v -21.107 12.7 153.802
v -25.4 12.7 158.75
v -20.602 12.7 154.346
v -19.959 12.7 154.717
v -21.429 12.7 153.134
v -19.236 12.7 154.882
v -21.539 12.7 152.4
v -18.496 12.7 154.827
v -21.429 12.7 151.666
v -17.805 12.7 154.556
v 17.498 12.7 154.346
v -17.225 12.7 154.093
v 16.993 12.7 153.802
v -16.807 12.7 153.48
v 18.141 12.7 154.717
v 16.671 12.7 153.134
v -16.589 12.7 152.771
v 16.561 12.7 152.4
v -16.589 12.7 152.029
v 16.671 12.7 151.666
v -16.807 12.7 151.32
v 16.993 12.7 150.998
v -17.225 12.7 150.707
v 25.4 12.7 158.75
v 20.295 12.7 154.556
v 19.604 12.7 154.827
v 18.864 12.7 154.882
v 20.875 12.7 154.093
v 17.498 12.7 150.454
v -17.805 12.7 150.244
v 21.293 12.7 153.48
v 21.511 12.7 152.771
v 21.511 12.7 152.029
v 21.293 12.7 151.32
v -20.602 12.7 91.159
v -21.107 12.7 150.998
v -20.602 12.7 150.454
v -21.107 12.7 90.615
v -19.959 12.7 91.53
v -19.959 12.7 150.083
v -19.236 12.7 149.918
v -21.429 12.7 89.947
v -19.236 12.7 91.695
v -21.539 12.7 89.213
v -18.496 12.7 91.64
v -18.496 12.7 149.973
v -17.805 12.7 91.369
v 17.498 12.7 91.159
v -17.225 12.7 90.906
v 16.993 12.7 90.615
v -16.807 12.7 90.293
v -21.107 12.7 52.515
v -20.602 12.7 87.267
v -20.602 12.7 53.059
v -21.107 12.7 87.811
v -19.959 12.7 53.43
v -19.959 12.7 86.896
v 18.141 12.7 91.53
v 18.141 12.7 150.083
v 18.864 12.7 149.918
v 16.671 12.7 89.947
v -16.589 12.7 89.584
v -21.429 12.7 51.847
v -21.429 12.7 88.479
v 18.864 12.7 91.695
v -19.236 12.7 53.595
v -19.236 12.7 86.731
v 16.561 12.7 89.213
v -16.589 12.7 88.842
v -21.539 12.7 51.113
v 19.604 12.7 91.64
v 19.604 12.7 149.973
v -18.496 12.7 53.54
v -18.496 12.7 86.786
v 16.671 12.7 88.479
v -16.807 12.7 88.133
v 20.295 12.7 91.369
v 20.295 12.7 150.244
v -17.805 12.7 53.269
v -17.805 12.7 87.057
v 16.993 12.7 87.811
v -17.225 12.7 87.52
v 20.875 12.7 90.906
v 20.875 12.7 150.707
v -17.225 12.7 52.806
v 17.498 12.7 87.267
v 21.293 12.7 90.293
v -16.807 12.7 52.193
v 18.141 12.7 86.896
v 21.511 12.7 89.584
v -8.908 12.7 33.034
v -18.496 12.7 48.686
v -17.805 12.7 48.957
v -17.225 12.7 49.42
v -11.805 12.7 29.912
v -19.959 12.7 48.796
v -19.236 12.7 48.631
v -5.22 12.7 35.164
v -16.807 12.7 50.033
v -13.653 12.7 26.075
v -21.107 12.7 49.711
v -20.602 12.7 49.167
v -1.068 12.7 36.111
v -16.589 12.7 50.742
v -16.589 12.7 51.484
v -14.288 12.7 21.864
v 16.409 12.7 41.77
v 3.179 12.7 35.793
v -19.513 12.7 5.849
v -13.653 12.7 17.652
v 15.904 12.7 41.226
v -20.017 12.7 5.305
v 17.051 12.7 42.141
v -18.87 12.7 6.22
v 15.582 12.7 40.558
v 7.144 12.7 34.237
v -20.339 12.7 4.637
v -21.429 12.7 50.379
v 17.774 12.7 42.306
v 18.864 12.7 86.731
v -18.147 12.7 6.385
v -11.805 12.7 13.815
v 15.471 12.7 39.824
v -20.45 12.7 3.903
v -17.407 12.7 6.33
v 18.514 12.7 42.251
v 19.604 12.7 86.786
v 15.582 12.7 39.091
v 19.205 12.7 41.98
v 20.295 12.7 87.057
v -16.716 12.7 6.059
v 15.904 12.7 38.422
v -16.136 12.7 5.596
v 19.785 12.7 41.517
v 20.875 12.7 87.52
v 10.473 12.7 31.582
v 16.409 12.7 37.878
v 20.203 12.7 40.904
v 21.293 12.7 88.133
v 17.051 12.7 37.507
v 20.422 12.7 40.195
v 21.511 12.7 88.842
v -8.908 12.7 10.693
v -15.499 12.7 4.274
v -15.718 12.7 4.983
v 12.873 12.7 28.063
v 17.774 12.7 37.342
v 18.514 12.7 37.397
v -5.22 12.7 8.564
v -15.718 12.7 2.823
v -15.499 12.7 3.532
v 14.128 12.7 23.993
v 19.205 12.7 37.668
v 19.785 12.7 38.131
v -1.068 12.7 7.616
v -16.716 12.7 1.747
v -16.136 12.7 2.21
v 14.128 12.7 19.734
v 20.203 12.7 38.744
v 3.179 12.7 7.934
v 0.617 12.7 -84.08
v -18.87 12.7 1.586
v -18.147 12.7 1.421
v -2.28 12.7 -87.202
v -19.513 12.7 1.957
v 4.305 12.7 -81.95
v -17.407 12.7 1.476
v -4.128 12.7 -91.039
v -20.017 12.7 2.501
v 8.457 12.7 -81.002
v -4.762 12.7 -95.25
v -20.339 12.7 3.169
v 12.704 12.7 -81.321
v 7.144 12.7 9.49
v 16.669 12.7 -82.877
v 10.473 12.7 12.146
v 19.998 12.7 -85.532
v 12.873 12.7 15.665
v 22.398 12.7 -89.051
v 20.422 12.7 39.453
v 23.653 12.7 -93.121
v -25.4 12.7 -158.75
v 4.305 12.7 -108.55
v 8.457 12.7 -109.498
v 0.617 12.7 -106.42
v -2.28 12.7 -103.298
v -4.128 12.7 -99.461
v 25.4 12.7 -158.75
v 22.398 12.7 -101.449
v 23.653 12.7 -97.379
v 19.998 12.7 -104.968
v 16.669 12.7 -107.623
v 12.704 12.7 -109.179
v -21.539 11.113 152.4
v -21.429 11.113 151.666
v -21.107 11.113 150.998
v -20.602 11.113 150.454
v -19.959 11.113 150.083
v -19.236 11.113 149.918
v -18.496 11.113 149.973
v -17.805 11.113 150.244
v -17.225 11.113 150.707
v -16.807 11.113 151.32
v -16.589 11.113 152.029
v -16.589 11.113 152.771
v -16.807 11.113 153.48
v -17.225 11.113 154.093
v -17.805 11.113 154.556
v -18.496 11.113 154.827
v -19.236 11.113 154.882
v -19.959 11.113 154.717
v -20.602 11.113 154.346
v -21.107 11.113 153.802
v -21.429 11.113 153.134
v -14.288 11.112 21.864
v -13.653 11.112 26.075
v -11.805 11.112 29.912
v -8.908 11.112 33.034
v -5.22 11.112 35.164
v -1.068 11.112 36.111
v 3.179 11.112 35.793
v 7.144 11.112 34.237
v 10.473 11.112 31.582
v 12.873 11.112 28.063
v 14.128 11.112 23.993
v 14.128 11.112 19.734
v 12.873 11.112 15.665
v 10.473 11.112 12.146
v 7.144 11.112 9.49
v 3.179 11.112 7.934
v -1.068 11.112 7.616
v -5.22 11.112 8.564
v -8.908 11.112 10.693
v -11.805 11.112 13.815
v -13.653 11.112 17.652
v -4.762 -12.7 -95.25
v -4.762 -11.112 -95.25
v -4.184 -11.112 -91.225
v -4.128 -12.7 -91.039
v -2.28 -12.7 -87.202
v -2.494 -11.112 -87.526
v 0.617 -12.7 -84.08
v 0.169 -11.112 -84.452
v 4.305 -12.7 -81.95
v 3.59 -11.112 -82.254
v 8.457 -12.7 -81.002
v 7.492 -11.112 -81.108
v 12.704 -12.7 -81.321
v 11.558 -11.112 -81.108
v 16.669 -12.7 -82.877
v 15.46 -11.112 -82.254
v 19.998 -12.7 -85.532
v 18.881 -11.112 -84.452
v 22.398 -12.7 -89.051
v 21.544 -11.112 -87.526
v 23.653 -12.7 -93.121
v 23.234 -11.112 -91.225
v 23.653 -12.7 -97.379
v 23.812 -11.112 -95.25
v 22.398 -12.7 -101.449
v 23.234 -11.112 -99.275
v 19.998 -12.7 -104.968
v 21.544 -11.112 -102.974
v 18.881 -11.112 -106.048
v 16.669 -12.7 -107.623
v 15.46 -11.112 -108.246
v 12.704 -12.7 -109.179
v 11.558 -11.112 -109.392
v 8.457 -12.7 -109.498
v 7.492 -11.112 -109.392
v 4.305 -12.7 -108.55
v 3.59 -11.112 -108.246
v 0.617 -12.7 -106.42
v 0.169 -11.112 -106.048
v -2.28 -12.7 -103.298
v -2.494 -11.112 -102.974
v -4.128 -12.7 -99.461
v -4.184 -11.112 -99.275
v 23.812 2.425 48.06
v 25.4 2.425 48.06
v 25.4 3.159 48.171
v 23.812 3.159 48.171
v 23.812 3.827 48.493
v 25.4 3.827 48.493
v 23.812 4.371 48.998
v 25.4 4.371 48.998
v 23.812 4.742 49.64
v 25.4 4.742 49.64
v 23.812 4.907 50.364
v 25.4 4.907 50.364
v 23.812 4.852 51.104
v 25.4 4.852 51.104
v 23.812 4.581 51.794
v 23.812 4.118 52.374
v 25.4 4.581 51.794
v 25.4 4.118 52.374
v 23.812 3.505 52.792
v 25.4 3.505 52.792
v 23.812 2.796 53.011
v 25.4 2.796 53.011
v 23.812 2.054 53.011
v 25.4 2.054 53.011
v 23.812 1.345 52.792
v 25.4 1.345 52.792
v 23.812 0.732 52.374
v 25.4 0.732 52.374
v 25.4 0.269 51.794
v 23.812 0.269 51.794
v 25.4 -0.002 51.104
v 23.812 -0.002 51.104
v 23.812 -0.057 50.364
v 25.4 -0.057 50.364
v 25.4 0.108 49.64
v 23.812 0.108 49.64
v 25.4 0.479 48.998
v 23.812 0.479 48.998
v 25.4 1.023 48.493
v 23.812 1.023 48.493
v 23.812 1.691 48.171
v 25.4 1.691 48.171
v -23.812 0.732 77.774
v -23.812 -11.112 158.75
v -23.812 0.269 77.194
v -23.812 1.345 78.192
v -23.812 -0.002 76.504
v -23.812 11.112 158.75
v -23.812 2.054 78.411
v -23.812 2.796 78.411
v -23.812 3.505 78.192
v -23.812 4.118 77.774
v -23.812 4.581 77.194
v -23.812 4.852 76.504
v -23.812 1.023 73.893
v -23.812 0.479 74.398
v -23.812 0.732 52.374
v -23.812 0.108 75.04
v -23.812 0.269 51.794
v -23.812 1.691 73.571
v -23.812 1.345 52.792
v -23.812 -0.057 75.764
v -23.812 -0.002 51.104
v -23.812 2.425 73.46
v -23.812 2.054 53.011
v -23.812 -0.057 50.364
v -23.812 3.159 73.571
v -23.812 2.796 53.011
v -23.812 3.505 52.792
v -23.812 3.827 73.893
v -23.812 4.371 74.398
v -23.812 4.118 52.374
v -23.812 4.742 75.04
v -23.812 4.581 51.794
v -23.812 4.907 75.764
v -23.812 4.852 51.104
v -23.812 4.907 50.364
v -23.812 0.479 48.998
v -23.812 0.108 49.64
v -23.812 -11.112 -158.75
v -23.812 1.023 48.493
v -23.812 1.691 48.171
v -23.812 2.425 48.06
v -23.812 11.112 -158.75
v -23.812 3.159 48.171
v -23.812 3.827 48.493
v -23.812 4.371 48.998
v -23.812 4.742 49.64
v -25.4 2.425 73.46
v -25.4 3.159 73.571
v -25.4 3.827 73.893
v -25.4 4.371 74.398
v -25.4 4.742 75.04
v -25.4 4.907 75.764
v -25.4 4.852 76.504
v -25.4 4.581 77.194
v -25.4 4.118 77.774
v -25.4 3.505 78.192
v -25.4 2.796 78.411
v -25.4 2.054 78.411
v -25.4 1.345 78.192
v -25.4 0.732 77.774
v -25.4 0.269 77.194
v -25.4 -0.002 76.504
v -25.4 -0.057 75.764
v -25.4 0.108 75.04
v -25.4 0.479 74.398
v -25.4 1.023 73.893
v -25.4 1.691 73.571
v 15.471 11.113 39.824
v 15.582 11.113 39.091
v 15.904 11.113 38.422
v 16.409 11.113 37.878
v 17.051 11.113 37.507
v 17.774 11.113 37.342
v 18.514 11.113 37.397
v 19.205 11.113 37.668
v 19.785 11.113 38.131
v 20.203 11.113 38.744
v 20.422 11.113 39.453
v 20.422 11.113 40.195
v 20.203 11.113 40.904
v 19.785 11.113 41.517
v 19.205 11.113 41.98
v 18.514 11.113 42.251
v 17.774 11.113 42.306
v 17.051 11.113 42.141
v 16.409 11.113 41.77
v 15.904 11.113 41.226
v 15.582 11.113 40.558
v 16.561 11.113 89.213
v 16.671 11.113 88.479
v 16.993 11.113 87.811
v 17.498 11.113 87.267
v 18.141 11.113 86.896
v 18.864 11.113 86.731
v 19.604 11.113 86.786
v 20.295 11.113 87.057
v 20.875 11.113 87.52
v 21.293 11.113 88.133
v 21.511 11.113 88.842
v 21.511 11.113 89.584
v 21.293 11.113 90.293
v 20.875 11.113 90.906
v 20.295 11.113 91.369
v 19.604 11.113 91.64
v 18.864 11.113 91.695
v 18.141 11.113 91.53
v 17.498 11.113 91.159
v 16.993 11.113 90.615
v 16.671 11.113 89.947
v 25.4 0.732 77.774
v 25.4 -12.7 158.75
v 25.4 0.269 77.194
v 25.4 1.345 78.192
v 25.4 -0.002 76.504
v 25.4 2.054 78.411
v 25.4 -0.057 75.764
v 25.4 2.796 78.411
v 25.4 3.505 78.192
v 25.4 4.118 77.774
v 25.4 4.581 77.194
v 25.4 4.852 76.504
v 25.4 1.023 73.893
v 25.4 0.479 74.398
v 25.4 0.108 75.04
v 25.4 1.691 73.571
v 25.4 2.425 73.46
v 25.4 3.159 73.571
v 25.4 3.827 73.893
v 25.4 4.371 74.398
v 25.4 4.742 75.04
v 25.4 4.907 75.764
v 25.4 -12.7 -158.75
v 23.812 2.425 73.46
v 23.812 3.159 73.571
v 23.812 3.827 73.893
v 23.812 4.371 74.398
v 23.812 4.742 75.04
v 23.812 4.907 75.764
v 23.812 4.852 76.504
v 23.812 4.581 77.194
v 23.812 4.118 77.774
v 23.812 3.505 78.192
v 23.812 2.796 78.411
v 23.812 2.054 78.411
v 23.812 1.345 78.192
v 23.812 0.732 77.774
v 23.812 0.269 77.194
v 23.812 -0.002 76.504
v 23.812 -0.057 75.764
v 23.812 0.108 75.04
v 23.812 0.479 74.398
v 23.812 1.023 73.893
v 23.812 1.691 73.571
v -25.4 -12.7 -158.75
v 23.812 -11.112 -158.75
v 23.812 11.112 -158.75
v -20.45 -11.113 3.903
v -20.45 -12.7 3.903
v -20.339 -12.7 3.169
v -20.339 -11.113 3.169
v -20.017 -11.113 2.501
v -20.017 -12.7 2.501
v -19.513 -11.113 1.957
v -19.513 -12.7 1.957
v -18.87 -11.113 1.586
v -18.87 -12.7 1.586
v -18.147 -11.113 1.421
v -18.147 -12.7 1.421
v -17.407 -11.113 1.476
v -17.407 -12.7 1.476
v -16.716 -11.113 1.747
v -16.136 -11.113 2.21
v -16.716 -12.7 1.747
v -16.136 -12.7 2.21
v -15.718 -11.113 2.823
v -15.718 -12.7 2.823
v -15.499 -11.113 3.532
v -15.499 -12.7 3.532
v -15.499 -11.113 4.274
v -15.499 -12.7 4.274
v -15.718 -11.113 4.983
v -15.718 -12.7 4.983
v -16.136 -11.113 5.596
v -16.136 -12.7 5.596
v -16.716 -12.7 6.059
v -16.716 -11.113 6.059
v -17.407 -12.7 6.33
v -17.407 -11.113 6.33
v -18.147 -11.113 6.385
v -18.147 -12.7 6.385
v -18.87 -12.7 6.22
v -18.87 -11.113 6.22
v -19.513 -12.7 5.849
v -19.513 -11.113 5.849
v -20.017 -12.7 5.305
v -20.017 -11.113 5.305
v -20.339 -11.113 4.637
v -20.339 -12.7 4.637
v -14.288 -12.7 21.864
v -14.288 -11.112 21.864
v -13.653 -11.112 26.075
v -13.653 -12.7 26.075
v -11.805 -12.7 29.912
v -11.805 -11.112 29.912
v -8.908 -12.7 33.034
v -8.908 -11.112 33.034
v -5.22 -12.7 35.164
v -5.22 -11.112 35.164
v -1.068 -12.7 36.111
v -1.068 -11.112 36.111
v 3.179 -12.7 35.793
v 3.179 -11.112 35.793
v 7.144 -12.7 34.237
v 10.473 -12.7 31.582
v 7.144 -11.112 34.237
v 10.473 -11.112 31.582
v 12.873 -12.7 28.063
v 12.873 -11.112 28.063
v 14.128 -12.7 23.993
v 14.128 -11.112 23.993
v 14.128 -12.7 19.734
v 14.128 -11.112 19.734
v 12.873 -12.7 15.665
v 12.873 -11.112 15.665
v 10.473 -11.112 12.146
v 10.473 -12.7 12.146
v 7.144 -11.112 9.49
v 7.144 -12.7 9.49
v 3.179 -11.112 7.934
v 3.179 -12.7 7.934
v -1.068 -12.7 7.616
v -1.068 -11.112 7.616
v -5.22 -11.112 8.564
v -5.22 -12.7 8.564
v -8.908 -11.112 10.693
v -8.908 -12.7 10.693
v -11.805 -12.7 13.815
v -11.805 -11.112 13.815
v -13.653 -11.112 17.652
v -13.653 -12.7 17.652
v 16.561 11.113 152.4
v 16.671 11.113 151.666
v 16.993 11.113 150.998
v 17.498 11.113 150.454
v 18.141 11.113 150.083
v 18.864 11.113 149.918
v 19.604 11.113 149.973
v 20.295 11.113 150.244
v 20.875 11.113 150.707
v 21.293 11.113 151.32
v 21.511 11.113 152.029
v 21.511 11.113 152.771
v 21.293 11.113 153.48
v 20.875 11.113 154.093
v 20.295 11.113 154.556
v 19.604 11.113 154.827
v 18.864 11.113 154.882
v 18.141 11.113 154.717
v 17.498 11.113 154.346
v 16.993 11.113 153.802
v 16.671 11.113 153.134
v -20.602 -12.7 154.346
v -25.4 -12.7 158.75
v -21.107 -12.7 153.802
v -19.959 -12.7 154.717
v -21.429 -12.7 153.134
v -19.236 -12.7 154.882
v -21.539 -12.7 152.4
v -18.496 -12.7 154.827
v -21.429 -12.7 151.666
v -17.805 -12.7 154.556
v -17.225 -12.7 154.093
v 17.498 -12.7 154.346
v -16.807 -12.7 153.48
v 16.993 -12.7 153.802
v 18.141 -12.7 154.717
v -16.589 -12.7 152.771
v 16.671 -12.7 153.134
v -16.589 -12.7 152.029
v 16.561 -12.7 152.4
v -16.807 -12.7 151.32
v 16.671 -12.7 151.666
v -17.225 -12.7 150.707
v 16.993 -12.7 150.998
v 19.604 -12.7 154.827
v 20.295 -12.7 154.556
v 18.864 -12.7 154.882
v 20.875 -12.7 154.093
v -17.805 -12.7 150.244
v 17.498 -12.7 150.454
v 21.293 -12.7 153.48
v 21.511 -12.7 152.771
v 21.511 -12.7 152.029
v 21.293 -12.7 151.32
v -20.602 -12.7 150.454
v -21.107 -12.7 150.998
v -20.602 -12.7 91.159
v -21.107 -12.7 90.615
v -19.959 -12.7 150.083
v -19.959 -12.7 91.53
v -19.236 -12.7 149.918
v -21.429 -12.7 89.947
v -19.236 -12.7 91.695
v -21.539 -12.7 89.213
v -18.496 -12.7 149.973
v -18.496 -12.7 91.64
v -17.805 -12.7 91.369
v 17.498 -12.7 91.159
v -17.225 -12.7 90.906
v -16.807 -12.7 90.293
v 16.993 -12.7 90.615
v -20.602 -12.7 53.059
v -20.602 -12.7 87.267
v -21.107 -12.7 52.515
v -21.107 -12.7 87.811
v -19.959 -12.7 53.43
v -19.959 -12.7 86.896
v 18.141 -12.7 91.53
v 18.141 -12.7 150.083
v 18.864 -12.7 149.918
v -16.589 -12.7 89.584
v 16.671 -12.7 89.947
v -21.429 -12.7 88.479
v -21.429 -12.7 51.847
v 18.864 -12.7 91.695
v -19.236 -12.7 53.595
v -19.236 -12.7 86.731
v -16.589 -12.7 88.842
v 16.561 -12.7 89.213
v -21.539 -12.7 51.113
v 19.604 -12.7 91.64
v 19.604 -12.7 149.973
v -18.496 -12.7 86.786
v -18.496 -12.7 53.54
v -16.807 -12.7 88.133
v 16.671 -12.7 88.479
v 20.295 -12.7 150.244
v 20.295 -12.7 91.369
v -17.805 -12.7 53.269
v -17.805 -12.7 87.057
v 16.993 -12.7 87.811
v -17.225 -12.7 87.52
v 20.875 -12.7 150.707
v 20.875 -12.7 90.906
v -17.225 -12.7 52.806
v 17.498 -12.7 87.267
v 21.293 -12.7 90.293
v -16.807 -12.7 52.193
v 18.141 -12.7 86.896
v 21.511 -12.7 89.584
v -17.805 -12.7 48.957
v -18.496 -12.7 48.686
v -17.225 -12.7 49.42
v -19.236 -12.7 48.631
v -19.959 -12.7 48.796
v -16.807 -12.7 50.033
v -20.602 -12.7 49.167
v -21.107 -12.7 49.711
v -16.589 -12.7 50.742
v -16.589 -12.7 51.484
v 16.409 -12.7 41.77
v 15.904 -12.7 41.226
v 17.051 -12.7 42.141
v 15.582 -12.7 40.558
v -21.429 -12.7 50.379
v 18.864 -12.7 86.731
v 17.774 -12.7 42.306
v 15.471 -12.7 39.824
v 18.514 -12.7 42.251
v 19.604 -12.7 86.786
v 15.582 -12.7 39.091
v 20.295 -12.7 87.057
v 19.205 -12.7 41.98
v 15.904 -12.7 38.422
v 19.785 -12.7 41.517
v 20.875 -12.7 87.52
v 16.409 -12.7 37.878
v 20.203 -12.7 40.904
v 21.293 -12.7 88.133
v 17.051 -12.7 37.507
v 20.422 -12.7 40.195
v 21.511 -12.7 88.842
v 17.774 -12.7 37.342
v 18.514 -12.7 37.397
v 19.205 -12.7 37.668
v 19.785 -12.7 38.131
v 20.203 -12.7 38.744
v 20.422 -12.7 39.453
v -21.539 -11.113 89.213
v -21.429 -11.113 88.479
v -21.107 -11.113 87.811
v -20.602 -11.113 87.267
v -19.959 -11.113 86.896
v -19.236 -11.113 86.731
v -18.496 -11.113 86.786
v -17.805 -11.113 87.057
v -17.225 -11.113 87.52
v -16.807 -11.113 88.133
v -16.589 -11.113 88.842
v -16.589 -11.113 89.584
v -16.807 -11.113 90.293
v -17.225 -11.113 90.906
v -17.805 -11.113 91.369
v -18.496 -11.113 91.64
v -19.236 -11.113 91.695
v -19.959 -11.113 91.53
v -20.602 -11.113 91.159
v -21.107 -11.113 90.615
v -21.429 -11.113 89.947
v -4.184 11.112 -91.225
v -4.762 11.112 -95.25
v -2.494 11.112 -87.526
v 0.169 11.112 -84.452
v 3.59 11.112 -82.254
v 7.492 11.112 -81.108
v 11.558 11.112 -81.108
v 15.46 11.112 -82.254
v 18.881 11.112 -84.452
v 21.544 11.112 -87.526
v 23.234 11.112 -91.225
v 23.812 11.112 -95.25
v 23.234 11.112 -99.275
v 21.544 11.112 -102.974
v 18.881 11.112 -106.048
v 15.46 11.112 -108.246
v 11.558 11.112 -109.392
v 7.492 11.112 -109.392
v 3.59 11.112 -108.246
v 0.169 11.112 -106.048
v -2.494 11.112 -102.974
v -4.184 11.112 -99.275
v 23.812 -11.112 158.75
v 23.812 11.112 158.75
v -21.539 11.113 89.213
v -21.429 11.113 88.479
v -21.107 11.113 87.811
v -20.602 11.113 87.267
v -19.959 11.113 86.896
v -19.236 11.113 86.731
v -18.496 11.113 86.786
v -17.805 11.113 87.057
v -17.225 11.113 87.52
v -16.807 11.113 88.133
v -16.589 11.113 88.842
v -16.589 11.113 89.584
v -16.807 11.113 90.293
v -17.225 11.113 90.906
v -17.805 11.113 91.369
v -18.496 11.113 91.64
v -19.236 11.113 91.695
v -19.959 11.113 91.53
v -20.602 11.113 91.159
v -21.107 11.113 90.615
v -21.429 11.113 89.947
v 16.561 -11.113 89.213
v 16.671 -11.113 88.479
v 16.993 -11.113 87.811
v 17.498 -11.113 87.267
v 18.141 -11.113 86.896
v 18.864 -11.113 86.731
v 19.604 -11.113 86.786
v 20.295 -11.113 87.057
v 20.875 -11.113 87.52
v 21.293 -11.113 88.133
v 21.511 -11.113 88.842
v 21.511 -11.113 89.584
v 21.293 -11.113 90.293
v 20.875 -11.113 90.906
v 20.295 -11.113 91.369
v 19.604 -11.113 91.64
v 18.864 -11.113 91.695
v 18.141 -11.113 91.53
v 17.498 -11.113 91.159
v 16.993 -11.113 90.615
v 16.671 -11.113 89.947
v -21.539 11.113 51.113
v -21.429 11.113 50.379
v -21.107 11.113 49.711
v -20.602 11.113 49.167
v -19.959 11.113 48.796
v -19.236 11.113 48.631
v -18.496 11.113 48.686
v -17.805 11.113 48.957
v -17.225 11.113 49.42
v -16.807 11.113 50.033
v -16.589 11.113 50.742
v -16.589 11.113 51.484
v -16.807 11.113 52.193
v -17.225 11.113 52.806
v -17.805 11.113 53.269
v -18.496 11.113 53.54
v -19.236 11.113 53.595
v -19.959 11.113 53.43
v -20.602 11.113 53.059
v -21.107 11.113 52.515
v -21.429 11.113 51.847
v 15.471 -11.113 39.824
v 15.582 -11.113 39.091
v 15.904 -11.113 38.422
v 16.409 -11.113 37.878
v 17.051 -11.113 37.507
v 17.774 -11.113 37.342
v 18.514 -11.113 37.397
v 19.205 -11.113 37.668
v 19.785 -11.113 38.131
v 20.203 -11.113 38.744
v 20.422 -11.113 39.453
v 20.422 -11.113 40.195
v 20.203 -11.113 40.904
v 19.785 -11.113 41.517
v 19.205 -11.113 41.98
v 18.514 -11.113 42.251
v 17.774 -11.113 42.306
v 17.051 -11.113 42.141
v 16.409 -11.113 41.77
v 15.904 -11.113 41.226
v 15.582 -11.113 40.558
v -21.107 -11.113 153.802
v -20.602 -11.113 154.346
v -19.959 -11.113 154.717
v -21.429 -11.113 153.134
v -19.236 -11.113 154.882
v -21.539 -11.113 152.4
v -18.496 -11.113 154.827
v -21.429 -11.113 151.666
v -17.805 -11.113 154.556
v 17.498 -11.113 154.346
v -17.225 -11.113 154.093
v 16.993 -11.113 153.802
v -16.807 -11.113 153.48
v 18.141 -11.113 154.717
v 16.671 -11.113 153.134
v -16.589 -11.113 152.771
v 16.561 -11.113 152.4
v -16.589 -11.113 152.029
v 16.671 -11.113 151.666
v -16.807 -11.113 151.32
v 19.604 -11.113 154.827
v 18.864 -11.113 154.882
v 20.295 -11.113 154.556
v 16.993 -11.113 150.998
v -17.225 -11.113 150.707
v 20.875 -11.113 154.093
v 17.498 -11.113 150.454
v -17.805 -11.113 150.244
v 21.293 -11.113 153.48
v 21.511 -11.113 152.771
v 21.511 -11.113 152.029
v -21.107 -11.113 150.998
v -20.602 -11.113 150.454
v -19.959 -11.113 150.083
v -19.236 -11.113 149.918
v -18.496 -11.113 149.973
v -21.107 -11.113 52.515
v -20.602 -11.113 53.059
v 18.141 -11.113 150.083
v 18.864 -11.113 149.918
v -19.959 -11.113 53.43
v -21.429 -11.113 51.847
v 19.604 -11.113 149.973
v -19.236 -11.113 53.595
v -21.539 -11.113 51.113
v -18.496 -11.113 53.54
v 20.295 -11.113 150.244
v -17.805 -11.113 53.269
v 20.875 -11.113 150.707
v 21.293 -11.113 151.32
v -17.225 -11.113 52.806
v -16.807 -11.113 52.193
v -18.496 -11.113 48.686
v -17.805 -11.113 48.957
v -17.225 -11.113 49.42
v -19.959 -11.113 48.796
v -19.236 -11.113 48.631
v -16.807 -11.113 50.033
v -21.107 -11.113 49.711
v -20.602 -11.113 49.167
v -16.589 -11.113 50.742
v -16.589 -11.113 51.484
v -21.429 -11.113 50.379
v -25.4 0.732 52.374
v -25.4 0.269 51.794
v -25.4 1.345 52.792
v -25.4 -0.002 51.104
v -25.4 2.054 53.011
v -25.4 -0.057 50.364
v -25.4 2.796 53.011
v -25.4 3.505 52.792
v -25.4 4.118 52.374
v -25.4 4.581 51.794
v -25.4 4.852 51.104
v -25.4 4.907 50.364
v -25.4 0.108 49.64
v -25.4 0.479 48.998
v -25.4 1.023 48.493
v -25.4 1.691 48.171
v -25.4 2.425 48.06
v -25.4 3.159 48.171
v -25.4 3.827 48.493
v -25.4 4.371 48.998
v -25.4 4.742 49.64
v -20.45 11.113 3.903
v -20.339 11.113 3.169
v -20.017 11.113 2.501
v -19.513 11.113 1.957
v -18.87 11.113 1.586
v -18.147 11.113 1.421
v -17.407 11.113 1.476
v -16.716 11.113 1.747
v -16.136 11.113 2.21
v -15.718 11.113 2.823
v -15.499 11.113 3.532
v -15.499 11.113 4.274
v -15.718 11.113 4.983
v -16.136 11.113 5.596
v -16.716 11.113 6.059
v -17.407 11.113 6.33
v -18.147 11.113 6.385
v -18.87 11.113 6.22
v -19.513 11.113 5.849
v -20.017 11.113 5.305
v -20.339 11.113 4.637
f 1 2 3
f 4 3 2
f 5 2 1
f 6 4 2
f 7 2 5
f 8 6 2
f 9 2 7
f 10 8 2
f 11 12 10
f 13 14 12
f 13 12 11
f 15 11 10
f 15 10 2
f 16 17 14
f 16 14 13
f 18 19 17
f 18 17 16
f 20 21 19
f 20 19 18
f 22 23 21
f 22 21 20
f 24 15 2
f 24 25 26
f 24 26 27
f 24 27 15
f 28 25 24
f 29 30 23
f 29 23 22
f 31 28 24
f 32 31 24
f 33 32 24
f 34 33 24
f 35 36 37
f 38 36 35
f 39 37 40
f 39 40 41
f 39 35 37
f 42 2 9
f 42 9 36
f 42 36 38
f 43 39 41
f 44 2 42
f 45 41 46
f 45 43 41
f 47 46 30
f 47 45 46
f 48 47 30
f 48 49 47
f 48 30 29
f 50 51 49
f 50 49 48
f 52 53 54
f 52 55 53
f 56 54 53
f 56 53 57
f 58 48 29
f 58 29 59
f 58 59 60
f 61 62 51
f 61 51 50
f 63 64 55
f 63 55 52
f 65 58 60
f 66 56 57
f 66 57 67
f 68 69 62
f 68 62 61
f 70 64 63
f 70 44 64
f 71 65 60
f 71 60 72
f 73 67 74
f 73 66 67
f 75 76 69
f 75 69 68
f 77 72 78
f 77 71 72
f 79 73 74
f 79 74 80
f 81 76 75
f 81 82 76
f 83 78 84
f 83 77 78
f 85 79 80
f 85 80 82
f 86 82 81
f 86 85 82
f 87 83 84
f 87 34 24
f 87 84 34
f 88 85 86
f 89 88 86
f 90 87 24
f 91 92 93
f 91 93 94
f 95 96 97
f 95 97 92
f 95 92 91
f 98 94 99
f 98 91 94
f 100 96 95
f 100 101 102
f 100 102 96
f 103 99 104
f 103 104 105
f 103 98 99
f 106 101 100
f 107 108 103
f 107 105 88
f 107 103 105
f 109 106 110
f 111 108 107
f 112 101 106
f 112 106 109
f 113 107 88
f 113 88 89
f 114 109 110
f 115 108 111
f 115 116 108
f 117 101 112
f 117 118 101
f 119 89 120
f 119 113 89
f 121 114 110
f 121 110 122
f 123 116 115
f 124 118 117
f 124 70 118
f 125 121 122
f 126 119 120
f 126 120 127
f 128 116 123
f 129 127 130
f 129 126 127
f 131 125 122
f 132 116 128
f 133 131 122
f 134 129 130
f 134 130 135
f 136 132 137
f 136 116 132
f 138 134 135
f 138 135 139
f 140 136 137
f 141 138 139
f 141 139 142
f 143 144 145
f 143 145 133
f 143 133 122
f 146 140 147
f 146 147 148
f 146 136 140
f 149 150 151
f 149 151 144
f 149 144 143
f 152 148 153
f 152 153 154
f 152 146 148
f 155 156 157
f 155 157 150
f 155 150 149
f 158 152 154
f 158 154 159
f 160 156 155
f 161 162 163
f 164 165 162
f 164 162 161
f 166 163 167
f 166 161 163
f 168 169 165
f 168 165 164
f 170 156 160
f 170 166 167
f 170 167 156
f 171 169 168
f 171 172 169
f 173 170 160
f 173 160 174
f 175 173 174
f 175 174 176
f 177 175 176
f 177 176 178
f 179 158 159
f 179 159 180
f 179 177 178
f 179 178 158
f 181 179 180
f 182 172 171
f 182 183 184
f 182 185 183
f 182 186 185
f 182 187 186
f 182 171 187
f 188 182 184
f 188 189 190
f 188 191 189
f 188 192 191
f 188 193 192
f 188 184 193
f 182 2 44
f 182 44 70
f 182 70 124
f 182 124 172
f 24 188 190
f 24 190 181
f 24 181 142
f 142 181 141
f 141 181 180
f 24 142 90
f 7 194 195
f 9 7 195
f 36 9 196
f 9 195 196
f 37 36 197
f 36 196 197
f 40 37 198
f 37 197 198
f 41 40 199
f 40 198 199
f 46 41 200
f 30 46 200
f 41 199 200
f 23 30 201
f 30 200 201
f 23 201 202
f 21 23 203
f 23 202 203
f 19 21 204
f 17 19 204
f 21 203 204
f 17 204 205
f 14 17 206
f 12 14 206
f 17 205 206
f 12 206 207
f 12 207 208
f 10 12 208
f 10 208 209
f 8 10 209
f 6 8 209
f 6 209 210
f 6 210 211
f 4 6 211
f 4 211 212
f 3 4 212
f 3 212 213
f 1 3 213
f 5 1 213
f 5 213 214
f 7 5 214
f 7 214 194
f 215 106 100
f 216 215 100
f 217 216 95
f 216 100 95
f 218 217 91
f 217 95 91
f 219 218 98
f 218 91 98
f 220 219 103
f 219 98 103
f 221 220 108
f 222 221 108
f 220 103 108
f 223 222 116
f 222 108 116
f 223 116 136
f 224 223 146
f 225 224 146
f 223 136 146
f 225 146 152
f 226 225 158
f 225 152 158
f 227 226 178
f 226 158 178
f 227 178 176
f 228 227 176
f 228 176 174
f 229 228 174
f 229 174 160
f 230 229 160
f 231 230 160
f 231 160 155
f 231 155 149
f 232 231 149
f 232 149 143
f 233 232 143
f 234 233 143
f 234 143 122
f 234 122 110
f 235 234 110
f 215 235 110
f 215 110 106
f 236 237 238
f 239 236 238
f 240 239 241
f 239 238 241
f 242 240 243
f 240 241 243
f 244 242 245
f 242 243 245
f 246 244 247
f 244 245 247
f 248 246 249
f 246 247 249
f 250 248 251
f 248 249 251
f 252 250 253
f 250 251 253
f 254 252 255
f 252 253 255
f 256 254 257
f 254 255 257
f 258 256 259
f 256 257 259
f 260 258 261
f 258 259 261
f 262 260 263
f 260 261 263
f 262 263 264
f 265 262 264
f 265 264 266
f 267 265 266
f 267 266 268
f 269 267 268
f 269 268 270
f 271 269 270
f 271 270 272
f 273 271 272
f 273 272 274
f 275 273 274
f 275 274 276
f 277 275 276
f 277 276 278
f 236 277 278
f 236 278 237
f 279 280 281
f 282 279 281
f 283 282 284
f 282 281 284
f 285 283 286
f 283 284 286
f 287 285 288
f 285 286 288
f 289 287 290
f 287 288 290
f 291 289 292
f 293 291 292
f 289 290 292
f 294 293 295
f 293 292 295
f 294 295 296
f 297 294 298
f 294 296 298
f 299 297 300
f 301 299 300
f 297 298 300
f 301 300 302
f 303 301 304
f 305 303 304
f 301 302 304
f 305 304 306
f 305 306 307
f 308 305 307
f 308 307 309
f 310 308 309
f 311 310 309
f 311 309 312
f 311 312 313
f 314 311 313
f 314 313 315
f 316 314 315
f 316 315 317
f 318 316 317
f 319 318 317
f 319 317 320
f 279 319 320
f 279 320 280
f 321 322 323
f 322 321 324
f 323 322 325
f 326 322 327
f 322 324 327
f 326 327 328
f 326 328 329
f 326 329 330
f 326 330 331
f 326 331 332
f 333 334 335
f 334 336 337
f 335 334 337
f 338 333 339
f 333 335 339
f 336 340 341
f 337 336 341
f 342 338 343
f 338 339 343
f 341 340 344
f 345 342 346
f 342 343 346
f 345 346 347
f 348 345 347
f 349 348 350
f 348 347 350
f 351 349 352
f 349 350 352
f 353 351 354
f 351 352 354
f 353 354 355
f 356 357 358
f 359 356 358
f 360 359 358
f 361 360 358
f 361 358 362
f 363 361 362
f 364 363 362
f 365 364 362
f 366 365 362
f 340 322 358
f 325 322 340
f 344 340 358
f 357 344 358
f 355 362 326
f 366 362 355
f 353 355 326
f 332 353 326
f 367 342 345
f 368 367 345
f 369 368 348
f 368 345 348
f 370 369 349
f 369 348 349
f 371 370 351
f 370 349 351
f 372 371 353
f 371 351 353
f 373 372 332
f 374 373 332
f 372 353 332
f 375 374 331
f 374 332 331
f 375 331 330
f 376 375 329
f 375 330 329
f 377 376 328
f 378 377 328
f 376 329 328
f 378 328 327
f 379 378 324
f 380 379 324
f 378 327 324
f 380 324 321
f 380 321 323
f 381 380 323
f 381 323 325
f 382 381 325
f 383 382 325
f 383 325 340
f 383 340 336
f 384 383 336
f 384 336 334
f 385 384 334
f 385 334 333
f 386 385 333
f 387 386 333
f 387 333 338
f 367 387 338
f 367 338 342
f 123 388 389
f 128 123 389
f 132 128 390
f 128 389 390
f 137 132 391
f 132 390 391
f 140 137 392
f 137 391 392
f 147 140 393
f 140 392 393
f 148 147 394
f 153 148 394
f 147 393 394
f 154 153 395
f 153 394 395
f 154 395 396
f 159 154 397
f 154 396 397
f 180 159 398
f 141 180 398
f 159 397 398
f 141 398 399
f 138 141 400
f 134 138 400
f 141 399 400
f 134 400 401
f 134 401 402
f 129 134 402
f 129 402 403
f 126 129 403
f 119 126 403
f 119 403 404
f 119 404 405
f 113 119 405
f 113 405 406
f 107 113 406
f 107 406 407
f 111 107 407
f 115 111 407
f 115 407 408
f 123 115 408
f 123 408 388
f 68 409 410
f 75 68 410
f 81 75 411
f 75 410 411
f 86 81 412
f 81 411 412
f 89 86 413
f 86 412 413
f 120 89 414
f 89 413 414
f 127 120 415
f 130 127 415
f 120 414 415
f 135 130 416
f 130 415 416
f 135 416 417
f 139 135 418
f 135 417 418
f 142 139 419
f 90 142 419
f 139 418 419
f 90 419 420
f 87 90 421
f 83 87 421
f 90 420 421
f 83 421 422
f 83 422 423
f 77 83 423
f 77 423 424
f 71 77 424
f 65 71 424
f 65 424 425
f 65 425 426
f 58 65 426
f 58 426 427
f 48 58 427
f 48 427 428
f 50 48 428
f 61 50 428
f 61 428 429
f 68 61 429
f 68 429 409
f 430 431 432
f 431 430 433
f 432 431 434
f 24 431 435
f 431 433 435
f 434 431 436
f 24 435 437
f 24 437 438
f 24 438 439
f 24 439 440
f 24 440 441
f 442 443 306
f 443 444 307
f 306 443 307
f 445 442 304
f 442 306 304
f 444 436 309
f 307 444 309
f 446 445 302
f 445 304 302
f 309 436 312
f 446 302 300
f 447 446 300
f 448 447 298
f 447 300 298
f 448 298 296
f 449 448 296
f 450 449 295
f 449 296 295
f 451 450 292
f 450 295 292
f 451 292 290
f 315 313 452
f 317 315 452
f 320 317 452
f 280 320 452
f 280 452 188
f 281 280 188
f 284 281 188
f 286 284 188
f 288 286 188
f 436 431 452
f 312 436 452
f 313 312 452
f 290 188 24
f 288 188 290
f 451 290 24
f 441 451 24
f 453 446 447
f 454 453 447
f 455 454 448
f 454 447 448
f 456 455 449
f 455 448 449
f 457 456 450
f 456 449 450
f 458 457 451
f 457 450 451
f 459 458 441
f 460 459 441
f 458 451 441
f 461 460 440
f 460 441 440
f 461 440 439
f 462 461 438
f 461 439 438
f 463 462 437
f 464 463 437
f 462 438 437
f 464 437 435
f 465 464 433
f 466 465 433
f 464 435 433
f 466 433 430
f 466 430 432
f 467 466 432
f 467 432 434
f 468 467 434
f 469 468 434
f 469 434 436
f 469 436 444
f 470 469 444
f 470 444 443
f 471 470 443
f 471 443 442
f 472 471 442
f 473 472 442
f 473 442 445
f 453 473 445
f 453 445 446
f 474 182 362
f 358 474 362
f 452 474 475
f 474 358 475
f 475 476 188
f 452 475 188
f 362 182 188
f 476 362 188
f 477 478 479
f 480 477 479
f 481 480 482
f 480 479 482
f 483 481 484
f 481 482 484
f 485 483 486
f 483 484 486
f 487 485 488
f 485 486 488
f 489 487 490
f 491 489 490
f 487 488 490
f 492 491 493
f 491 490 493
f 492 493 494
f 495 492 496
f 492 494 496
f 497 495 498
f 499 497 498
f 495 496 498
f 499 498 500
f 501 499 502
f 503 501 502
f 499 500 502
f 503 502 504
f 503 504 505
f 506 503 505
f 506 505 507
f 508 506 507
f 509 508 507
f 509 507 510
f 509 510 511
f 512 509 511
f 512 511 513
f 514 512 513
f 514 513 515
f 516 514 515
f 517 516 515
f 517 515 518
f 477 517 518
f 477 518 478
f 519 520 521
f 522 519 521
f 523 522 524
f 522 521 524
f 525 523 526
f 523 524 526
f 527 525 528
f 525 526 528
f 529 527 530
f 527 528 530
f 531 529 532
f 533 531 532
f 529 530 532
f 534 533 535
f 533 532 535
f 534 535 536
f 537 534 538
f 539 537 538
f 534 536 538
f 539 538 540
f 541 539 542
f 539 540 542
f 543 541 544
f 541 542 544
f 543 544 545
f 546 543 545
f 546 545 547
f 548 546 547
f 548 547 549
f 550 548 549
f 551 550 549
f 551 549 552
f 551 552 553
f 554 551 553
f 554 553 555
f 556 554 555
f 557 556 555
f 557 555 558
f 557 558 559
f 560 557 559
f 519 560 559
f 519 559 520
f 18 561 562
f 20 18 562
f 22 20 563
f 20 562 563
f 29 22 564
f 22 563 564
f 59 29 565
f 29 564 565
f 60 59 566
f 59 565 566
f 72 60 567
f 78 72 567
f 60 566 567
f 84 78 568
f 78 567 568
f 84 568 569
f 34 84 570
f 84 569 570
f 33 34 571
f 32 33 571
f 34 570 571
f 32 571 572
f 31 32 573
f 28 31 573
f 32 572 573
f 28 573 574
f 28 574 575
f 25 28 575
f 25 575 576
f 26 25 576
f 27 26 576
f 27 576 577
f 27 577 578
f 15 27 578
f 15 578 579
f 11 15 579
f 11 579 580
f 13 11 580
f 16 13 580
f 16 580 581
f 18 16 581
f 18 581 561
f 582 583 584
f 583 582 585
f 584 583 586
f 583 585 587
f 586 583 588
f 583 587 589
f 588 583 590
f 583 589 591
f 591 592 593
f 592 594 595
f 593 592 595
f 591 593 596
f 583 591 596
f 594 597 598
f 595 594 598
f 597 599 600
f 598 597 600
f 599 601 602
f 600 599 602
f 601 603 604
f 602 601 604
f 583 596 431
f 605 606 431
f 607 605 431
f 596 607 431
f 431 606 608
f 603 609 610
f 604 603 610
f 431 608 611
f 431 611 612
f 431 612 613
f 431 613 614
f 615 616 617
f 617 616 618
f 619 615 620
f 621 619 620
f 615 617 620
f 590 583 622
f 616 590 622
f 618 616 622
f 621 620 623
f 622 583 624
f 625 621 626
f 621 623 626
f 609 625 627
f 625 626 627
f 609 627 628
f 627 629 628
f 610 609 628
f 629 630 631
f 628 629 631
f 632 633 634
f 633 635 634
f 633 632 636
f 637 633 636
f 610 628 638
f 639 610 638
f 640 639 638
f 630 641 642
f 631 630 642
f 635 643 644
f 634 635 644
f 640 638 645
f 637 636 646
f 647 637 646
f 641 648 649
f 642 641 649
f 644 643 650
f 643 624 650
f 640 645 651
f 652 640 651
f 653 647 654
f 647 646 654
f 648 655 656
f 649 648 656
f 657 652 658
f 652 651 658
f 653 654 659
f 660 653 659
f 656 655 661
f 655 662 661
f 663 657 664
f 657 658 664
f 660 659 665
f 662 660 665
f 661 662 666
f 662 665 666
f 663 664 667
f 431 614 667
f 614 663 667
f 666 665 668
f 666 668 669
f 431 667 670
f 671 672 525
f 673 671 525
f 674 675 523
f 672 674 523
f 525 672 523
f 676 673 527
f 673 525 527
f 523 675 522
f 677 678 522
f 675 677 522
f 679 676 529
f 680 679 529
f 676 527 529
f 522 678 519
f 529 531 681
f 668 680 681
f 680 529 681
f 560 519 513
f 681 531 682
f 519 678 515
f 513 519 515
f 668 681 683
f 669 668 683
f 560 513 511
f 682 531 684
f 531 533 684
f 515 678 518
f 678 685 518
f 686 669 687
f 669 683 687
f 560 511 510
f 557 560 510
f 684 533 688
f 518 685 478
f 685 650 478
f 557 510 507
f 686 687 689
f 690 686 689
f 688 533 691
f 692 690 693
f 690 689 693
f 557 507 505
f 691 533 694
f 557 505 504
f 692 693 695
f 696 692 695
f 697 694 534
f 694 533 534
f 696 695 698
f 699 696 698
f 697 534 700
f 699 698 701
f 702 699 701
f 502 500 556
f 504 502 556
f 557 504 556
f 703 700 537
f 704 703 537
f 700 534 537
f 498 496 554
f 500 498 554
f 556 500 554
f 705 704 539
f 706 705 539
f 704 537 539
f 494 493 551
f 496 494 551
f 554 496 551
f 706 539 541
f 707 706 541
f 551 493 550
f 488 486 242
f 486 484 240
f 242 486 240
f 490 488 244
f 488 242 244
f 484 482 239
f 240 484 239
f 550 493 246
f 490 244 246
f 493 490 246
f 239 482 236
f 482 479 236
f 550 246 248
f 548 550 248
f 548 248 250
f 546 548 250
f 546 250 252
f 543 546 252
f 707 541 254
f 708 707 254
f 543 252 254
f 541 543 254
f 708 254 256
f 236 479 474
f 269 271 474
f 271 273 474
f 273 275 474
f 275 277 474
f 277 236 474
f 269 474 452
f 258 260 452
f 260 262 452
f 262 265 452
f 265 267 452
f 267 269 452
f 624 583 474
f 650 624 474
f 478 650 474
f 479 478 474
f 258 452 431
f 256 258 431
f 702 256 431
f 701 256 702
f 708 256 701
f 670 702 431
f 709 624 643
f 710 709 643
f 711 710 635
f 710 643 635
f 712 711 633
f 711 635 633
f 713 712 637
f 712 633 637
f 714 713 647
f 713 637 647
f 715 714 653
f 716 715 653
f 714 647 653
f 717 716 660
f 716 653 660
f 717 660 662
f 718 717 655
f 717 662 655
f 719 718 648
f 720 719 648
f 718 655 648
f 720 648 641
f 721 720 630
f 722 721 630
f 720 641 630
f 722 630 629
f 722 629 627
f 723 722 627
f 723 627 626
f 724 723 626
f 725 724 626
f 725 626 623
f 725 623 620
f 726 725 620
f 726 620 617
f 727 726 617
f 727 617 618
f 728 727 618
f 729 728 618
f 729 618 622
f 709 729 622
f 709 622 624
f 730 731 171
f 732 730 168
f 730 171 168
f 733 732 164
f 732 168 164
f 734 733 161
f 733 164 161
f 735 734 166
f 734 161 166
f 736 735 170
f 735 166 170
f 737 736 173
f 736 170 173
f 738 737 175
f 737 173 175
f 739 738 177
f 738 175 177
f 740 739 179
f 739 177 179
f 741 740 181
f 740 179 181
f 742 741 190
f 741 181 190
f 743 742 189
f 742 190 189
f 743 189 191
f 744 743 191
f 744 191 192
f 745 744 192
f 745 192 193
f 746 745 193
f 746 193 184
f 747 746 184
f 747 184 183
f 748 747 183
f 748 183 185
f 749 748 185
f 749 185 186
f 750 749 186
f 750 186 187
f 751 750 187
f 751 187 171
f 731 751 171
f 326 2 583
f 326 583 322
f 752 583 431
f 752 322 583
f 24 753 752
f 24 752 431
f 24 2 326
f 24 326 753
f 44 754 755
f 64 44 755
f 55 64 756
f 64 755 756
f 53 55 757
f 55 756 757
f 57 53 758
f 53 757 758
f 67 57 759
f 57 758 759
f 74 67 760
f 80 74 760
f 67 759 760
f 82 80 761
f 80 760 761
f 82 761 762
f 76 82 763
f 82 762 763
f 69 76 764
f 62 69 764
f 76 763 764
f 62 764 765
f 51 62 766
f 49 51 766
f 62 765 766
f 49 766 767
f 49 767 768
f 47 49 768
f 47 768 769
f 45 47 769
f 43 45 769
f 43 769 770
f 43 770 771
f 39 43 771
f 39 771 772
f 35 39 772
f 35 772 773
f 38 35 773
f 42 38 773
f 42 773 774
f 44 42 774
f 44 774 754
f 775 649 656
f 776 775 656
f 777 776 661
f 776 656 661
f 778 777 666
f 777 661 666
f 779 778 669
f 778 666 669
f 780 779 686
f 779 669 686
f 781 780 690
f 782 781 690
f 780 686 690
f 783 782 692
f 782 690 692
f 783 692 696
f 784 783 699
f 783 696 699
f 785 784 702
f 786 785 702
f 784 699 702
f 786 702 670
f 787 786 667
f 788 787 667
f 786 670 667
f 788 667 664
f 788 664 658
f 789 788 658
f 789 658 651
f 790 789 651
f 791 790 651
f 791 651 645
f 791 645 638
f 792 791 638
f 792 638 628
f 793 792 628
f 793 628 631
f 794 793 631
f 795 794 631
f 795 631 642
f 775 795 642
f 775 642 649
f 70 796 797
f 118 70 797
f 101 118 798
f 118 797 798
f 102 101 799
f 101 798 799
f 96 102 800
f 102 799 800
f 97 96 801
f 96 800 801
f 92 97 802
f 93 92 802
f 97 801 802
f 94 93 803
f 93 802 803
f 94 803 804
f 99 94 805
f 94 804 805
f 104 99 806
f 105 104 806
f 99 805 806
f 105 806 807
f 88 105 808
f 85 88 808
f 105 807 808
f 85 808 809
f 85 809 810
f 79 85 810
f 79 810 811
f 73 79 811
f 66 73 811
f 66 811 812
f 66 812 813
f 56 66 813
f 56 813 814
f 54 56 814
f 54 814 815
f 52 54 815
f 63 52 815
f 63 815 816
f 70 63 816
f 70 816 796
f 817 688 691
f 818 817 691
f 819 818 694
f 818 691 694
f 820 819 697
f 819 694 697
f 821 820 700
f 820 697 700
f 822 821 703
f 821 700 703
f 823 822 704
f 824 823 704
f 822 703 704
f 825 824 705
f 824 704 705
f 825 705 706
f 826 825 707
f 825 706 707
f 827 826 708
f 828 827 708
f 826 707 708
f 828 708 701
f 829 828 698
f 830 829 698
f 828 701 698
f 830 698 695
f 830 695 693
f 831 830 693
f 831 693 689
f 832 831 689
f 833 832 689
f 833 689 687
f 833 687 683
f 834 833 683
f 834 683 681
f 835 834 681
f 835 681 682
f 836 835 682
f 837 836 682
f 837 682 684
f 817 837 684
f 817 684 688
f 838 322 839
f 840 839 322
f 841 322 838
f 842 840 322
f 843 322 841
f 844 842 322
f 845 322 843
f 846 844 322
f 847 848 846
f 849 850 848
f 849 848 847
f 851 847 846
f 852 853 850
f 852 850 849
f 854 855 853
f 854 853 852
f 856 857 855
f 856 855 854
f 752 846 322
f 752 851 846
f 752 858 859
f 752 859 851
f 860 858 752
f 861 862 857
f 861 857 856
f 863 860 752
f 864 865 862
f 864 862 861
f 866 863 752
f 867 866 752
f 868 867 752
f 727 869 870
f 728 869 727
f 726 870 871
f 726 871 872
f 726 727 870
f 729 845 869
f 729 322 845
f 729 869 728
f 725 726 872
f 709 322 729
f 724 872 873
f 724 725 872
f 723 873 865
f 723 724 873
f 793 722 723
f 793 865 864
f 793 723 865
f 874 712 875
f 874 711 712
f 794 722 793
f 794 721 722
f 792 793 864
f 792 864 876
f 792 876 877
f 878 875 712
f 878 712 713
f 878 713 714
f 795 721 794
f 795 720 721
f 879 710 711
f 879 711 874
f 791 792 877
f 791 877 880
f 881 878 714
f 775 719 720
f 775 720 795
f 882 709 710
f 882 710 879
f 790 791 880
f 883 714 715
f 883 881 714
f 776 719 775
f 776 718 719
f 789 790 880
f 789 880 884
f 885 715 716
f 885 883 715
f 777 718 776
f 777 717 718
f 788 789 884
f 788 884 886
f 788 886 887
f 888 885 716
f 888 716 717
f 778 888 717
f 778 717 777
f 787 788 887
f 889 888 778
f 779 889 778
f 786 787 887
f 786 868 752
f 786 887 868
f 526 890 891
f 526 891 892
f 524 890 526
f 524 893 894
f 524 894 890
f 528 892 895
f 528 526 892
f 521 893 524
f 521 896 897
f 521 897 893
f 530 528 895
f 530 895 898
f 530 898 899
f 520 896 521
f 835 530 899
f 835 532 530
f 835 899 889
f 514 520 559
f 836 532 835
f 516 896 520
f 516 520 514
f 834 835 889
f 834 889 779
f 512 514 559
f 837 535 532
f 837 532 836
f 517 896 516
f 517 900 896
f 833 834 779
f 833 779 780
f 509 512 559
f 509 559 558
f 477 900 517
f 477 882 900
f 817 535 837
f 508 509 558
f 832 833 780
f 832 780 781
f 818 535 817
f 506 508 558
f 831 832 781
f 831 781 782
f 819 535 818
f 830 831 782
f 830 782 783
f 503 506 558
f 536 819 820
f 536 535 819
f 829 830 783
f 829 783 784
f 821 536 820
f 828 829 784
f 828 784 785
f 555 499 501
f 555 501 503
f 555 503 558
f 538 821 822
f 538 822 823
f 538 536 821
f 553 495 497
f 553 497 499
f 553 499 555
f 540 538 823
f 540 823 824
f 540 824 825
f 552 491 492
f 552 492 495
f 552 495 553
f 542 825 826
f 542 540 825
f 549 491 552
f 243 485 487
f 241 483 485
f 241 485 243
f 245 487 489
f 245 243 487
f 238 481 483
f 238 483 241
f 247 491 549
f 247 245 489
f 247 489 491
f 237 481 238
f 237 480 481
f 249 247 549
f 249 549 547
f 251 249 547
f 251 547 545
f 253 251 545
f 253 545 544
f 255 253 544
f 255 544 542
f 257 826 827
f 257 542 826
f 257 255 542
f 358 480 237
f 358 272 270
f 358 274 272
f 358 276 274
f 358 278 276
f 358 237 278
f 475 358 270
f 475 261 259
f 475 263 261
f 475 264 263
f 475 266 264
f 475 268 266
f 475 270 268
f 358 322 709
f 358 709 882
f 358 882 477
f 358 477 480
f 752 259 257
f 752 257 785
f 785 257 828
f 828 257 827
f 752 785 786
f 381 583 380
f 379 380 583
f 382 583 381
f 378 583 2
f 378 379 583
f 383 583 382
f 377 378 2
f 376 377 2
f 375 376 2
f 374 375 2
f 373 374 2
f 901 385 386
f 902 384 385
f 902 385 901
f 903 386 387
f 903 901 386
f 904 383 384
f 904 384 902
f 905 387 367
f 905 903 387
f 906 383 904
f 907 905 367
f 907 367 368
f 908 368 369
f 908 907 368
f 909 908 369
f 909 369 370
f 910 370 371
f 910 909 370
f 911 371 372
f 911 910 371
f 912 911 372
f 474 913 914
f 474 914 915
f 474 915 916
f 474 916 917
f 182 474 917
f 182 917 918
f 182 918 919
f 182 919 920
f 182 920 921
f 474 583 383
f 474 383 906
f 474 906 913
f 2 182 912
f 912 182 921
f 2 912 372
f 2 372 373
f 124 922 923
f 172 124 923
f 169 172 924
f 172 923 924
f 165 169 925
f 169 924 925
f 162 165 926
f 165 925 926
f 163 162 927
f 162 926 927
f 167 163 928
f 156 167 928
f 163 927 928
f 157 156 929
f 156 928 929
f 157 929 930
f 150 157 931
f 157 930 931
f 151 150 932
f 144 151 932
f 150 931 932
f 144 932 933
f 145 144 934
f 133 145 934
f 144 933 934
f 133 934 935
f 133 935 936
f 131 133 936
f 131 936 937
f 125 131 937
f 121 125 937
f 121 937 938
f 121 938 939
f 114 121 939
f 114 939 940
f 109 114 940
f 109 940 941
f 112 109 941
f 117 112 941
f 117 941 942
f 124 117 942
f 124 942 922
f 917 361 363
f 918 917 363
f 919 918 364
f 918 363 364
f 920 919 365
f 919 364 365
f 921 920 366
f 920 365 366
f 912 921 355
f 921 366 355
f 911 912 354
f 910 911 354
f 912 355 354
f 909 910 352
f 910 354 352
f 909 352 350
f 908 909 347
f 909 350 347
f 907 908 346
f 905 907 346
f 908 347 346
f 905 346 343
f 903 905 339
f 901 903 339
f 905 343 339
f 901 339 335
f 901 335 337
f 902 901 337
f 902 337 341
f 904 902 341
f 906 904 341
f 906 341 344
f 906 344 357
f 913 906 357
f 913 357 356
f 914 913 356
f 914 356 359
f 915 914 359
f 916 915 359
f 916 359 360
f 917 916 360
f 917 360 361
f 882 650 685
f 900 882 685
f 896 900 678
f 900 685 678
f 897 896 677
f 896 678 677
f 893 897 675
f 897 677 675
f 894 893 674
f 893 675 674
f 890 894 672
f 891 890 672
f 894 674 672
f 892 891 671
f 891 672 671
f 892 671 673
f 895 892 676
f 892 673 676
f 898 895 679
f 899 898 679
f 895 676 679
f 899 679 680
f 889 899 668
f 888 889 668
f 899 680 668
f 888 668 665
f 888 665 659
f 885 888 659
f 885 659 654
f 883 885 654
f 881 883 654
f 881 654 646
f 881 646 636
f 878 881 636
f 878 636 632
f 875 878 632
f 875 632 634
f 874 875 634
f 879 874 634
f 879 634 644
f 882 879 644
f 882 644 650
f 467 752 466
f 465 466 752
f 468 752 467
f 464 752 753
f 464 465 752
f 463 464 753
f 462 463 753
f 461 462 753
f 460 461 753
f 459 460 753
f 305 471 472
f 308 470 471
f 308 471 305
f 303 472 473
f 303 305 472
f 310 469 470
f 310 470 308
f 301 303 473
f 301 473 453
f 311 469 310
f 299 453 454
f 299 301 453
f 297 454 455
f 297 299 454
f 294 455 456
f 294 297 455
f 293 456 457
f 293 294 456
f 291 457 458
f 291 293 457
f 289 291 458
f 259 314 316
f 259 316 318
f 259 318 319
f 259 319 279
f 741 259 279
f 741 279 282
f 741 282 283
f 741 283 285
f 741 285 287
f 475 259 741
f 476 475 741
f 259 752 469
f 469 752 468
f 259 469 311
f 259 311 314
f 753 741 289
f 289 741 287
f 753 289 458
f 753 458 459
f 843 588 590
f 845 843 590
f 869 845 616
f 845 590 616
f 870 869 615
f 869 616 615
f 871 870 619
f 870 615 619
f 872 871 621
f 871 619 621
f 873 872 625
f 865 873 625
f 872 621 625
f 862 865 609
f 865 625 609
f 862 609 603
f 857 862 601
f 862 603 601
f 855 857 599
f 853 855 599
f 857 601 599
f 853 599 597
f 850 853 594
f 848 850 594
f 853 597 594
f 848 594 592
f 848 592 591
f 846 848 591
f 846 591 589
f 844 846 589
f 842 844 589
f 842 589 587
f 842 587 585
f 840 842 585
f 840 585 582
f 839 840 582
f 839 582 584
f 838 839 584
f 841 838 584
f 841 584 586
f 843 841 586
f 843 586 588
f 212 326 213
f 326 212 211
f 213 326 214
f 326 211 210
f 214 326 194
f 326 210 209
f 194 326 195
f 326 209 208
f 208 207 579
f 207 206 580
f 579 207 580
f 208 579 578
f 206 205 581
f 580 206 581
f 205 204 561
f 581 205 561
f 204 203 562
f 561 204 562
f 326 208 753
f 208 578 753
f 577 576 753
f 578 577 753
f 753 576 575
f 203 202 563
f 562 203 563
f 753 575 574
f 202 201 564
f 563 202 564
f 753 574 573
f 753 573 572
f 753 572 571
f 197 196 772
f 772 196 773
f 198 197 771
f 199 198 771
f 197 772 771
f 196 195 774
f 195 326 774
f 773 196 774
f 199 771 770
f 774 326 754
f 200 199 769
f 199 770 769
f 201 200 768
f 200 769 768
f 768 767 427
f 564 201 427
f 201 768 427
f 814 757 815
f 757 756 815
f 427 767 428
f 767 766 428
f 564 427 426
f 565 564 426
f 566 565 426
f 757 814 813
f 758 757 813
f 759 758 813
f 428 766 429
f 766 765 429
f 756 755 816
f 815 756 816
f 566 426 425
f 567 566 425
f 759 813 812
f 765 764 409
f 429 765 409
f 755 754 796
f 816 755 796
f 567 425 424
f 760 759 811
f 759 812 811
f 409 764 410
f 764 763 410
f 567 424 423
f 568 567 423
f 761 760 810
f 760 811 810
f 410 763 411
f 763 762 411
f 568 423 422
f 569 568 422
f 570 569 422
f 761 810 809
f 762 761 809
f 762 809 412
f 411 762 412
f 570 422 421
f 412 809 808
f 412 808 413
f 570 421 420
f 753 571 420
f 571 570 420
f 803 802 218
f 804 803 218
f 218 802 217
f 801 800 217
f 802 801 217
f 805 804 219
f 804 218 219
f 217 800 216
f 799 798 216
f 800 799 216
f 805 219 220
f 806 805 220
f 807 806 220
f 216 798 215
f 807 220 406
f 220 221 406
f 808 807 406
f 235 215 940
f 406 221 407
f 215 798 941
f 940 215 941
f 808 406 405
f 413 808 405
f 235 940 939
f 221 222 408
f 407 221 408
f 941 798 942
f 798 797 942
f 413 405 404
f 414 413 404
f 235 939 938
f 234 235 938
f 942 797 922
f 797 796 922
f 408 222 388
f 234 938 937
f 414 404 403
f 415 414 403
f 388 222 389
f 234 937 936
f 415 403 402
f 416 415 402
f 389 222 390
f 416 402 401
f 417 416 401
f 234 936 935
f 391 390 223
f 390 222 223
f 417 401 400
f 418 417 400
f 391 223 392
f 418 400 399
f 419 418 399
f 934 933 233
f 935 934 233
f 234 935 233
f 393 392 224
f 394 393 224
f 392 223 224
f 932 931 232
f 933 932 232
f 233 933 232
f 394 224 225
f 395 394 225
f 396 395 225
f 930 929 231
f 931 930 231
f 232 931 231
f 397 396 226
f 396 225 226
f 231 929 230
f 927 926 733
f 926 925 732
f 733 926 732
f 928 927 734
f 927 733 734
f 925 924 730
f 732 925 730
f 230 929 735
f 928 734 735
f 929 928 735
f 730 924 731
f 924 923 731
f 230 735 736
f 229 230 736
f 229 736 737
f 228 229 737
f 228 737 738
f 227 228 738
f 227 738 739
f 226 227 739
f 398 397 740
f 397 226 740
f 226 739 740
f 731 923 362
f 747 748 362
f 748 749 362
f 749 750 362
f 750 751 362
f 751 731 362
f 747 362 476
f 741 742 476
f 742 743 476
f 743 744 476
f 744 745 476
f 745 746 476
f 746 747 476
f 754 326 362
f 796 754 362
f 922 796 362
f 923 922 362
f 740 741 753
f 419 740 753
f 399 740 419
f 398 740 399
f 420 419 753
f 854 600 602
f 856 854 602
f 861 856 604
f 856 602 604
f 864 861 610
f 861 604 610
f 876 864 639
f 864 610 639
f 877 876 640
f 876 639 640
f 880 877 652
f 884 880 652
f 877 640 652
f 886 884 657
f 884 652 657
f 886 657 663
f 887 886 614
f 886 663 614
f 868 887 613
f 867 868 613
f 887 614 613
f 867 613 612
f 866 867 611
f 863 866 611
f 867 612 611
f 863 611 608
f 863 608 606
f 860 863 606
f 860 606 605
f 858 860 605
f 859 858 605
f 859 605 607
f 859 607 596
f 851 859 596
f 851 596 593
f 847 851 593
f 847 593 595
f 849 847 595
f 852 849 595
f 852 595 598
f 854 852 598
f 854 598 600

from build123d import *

# Parameters (mm, degrees)
BOSS_EXTRUDE1_DEPTH      = 158.750001
BOSS_EXTRUDE1_DEPTH_BACK = 158.750001
SKETCH3_W                = 50.8
SKETCH3_H                = 25.4
SKETCH3_W_2              = 47.625
SKETCH3_H_2              = 22.225
SKETCH4_R                = 14.2875
CUT_EXTRUDE1_DEPTH       = 39.37
F_10_CLEARANCE_HOLE1_D   = 4.9784
F_10_CLEARANCE_HOLE2_D   = 4.9784
F_10_CLEARANCE_HOLE3_D   = 4.9784


with BuildPart() as part:
    # Sketch3 → Boss-Extrude1 (new, two sides: drawn at the far end of the back side and taken through both)
    with BuildSketch(Plane.XY.offset(-BOSS_EXTRUDE1_DEPTH_BACK)):
        Rectangle(SKETCH3_W, SKETCH3_H)
        Rectangle(SKETCH3_W_2, SKETCH3_H_2, mode=Mode.SUBTRACT)
    extrude(amount=BOSS_EXTRUDE1_DEPTH + BOSS_EXTRUDE1_DEPTH_BACK)

    # Sketch4 → Cut-Extrude1 (cut)
    with BuildSketch(Plane(origin=(0, 12.7, 0), x_dir=(1, 0, 0), z_dir=(0, 1, 0))):
        with Locations(Location((9.525, 95.250000508, 0), (0, 0, 180))):
            Circle(SKETCH4_R)
        with Locations(Location((0, -21.863697987, 0), (0, 0, 180))):
            Circle(SKETCH4_R)
    extrude(amount=-CUT_EXTRUDE1_DEPTH, mode=Mode.SUBTRACT)

    # #10 Clearance Hole1 (through all)
    with Locations(Plane(origin=(0, 12.7, 0), x_dir=(1, 0, 0), z_dir=(0, 1, 0))):
        with Locations((-17.960512242, -3.903185745), (17.960512242, -39.824210229)):
            Hole(F_10_CLEARANCE_HOLE1_D / 2)

    # #10 Clearance Hole2 (through all)
    with Locations(Plane.ZY.offset(25.4)):
        with Locations((50.549668409, 2.425), (75.949668409, 2.425)):
            Hole(F_10_CLEARANCE_HOLE2_D / 2)

    # #10 Clearance Hole3 (through all)
    with Locations(Plane(origin=(0, 12.7, 0), x_dir=(1, 0, 0), z_dir=(0, 1, 0))):
        with Locations((-19.05, -51.113080493), (-19.05, -89.213080493), (19.05, -89.213080493), (19.05, -152.400000508), (-19.05, -152.400000508)):
            Hole(F_10_CLEARANCE_HOLE3_D / 2)


solid = part.part
